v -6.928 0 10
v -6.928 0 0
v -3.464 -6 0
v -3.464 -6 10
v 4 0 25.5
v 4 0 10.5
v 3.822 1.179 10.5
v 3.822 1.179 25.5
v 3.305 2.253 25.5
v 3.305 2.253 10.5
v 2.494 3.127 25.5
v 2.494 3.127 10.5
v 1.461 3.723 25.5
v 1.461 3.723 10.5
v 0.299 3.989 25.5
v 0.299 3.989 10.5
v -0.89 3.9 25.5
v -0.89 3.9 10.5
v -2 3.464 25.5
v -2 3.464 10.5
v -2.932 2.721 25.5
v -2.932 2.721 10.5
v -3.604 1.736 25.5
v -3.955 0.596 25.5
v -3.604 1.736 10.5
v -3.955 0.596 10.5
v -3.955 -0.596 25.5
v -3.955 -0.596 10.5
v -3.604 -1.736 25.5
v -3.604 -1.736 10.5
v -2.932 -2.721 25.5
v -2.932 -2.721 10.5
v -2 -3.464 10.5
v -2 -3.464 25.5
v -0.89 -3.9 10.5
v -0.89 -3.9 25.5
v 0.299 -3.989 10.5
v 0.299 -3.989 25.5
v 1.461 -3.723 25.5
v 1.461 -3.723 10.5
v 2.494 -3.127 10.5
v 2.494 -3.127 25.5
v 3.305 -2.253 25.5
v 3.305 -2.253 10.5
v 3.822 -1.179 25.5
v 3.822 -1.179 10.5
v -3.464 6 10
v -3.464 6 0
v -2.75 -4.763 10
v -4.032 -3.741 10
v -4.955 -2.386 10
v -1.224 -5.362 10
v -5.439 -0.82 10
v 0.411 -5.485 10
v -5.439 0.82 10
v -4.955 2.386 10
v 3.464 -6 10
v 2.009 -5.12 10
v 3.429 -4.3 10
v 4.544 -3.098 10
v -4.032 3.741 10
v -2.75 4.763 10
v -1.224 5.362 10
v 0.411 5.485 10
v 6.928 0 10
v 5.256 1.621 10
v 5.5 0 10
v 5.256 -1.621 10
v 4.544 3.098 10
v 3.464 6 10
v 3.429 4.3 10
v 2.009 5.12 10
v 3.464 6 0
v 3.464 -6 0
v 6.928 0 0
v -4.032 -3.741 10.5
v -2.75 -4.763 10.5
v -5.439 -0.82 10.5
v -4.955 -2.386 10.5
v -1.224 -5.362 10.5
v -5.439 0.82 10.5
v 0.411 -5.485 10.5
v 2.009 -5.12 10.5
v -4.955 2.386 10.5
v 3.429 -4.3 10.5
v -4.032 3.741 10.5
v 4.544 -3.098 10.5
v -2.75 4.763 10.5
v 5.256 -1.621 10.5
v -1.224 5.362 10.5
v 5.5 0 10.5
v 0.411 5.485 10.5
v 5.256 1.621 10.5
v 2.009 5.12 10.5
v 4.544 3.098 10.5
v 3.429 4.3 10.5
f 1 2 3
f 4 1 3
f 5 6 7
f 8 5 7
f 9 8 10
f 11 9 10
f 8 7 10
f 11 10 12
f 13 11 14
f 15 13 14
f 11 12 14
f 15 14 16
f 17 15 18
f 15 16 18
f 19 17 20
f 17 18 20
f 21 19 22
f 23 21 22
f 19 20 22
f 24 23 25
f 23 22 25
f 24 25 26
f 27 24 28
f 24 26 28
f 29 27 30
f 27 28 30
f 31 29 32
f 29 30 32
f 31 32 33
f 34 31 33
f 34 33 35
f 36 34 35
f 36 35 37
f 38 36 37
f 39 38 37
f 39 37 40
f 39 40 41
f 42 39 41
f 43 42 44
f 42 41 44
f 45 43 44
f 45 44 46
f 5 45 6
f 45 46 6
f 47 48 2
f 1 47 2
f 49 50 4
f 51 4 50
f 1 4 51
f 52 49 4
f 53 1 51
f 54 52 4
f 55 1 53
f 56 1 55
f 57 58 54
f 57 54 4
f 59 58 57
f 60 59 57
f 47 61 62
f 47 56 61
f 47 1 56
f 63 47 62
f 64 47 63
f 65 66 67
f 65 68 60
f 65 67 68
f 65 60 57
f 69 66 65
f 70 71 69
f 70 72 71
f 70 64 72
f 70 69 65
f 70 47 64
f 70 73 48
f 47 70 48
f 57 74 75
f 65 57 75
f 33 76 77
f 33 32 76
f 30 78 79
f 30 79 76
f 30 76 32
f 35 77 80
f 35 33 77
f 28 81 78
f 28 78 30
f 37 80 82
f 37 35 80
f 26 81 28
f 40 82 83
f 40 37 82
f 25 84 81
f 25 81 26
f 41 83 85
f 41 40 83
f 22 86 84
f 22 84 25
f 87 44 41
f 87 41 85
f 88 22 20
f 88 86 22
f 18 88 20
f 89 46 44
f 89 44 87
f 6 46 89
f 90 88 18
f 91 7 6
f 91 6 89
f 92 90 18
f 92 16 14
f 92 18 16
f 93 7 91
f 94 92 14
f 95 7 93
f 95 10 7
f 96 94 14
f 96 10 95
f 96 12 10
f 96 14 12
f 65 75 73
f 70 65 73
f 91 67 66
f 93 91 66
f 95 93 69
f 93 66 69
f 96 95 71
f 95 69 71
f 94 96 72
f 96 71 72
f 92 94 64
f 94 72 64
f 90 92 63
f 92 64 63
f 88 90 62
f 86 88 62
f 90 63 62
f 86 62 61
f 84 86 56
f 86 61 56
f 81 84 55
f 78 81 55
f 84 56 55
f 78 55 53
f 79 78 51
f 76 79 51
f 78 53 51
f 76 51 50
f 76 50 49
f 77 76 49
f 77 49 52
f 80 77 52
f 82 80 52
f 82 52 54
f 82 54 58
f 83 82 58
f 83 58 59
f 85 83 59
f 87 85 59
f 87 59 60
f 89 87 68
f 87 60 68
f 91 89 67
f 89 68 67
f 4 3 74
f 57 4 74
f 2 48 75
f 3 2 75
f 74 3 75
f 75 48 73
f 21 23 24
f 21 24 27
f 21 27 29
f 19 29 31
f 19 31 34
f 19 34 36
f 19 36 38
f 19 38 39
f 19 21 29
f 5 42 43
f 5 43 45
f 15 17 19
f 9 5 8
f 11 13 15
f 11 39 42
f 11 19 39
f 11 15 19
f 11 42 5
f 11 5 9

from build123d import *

# Parameters (mm, degrees)
F1_DEPTH = 10
F2_R     = 5.5
F3_DEPTH = 0.5
F4_R     = 4
F5_DEPTH = 15


with BuildPart() as f1:
    # F0 (on Top) → F1 (new body)
    with BuildSketch(Plane.XY):
        Polygon((3.464102, 6), (-3.464102, 6), (-6.928203, 0), (-3.464102, -6), (3.464102, -6), (6.928203, 0), align=None)
    extrude(amount=F1_DEPTH)

    # F2 (on face) → F3 (join)
    with BuildSketch(Plane.XY.offset(10)):
        Circle(F2_R)
    extrude(amount=F3_DEPTH)

    # F4 (on face) → F5 (join)
    with BuildSketch(Plane.XY.offset(10.5)):
        Circle(F4_R)
    extrude(amount=F5_DEPTH)


solid = f1.part
